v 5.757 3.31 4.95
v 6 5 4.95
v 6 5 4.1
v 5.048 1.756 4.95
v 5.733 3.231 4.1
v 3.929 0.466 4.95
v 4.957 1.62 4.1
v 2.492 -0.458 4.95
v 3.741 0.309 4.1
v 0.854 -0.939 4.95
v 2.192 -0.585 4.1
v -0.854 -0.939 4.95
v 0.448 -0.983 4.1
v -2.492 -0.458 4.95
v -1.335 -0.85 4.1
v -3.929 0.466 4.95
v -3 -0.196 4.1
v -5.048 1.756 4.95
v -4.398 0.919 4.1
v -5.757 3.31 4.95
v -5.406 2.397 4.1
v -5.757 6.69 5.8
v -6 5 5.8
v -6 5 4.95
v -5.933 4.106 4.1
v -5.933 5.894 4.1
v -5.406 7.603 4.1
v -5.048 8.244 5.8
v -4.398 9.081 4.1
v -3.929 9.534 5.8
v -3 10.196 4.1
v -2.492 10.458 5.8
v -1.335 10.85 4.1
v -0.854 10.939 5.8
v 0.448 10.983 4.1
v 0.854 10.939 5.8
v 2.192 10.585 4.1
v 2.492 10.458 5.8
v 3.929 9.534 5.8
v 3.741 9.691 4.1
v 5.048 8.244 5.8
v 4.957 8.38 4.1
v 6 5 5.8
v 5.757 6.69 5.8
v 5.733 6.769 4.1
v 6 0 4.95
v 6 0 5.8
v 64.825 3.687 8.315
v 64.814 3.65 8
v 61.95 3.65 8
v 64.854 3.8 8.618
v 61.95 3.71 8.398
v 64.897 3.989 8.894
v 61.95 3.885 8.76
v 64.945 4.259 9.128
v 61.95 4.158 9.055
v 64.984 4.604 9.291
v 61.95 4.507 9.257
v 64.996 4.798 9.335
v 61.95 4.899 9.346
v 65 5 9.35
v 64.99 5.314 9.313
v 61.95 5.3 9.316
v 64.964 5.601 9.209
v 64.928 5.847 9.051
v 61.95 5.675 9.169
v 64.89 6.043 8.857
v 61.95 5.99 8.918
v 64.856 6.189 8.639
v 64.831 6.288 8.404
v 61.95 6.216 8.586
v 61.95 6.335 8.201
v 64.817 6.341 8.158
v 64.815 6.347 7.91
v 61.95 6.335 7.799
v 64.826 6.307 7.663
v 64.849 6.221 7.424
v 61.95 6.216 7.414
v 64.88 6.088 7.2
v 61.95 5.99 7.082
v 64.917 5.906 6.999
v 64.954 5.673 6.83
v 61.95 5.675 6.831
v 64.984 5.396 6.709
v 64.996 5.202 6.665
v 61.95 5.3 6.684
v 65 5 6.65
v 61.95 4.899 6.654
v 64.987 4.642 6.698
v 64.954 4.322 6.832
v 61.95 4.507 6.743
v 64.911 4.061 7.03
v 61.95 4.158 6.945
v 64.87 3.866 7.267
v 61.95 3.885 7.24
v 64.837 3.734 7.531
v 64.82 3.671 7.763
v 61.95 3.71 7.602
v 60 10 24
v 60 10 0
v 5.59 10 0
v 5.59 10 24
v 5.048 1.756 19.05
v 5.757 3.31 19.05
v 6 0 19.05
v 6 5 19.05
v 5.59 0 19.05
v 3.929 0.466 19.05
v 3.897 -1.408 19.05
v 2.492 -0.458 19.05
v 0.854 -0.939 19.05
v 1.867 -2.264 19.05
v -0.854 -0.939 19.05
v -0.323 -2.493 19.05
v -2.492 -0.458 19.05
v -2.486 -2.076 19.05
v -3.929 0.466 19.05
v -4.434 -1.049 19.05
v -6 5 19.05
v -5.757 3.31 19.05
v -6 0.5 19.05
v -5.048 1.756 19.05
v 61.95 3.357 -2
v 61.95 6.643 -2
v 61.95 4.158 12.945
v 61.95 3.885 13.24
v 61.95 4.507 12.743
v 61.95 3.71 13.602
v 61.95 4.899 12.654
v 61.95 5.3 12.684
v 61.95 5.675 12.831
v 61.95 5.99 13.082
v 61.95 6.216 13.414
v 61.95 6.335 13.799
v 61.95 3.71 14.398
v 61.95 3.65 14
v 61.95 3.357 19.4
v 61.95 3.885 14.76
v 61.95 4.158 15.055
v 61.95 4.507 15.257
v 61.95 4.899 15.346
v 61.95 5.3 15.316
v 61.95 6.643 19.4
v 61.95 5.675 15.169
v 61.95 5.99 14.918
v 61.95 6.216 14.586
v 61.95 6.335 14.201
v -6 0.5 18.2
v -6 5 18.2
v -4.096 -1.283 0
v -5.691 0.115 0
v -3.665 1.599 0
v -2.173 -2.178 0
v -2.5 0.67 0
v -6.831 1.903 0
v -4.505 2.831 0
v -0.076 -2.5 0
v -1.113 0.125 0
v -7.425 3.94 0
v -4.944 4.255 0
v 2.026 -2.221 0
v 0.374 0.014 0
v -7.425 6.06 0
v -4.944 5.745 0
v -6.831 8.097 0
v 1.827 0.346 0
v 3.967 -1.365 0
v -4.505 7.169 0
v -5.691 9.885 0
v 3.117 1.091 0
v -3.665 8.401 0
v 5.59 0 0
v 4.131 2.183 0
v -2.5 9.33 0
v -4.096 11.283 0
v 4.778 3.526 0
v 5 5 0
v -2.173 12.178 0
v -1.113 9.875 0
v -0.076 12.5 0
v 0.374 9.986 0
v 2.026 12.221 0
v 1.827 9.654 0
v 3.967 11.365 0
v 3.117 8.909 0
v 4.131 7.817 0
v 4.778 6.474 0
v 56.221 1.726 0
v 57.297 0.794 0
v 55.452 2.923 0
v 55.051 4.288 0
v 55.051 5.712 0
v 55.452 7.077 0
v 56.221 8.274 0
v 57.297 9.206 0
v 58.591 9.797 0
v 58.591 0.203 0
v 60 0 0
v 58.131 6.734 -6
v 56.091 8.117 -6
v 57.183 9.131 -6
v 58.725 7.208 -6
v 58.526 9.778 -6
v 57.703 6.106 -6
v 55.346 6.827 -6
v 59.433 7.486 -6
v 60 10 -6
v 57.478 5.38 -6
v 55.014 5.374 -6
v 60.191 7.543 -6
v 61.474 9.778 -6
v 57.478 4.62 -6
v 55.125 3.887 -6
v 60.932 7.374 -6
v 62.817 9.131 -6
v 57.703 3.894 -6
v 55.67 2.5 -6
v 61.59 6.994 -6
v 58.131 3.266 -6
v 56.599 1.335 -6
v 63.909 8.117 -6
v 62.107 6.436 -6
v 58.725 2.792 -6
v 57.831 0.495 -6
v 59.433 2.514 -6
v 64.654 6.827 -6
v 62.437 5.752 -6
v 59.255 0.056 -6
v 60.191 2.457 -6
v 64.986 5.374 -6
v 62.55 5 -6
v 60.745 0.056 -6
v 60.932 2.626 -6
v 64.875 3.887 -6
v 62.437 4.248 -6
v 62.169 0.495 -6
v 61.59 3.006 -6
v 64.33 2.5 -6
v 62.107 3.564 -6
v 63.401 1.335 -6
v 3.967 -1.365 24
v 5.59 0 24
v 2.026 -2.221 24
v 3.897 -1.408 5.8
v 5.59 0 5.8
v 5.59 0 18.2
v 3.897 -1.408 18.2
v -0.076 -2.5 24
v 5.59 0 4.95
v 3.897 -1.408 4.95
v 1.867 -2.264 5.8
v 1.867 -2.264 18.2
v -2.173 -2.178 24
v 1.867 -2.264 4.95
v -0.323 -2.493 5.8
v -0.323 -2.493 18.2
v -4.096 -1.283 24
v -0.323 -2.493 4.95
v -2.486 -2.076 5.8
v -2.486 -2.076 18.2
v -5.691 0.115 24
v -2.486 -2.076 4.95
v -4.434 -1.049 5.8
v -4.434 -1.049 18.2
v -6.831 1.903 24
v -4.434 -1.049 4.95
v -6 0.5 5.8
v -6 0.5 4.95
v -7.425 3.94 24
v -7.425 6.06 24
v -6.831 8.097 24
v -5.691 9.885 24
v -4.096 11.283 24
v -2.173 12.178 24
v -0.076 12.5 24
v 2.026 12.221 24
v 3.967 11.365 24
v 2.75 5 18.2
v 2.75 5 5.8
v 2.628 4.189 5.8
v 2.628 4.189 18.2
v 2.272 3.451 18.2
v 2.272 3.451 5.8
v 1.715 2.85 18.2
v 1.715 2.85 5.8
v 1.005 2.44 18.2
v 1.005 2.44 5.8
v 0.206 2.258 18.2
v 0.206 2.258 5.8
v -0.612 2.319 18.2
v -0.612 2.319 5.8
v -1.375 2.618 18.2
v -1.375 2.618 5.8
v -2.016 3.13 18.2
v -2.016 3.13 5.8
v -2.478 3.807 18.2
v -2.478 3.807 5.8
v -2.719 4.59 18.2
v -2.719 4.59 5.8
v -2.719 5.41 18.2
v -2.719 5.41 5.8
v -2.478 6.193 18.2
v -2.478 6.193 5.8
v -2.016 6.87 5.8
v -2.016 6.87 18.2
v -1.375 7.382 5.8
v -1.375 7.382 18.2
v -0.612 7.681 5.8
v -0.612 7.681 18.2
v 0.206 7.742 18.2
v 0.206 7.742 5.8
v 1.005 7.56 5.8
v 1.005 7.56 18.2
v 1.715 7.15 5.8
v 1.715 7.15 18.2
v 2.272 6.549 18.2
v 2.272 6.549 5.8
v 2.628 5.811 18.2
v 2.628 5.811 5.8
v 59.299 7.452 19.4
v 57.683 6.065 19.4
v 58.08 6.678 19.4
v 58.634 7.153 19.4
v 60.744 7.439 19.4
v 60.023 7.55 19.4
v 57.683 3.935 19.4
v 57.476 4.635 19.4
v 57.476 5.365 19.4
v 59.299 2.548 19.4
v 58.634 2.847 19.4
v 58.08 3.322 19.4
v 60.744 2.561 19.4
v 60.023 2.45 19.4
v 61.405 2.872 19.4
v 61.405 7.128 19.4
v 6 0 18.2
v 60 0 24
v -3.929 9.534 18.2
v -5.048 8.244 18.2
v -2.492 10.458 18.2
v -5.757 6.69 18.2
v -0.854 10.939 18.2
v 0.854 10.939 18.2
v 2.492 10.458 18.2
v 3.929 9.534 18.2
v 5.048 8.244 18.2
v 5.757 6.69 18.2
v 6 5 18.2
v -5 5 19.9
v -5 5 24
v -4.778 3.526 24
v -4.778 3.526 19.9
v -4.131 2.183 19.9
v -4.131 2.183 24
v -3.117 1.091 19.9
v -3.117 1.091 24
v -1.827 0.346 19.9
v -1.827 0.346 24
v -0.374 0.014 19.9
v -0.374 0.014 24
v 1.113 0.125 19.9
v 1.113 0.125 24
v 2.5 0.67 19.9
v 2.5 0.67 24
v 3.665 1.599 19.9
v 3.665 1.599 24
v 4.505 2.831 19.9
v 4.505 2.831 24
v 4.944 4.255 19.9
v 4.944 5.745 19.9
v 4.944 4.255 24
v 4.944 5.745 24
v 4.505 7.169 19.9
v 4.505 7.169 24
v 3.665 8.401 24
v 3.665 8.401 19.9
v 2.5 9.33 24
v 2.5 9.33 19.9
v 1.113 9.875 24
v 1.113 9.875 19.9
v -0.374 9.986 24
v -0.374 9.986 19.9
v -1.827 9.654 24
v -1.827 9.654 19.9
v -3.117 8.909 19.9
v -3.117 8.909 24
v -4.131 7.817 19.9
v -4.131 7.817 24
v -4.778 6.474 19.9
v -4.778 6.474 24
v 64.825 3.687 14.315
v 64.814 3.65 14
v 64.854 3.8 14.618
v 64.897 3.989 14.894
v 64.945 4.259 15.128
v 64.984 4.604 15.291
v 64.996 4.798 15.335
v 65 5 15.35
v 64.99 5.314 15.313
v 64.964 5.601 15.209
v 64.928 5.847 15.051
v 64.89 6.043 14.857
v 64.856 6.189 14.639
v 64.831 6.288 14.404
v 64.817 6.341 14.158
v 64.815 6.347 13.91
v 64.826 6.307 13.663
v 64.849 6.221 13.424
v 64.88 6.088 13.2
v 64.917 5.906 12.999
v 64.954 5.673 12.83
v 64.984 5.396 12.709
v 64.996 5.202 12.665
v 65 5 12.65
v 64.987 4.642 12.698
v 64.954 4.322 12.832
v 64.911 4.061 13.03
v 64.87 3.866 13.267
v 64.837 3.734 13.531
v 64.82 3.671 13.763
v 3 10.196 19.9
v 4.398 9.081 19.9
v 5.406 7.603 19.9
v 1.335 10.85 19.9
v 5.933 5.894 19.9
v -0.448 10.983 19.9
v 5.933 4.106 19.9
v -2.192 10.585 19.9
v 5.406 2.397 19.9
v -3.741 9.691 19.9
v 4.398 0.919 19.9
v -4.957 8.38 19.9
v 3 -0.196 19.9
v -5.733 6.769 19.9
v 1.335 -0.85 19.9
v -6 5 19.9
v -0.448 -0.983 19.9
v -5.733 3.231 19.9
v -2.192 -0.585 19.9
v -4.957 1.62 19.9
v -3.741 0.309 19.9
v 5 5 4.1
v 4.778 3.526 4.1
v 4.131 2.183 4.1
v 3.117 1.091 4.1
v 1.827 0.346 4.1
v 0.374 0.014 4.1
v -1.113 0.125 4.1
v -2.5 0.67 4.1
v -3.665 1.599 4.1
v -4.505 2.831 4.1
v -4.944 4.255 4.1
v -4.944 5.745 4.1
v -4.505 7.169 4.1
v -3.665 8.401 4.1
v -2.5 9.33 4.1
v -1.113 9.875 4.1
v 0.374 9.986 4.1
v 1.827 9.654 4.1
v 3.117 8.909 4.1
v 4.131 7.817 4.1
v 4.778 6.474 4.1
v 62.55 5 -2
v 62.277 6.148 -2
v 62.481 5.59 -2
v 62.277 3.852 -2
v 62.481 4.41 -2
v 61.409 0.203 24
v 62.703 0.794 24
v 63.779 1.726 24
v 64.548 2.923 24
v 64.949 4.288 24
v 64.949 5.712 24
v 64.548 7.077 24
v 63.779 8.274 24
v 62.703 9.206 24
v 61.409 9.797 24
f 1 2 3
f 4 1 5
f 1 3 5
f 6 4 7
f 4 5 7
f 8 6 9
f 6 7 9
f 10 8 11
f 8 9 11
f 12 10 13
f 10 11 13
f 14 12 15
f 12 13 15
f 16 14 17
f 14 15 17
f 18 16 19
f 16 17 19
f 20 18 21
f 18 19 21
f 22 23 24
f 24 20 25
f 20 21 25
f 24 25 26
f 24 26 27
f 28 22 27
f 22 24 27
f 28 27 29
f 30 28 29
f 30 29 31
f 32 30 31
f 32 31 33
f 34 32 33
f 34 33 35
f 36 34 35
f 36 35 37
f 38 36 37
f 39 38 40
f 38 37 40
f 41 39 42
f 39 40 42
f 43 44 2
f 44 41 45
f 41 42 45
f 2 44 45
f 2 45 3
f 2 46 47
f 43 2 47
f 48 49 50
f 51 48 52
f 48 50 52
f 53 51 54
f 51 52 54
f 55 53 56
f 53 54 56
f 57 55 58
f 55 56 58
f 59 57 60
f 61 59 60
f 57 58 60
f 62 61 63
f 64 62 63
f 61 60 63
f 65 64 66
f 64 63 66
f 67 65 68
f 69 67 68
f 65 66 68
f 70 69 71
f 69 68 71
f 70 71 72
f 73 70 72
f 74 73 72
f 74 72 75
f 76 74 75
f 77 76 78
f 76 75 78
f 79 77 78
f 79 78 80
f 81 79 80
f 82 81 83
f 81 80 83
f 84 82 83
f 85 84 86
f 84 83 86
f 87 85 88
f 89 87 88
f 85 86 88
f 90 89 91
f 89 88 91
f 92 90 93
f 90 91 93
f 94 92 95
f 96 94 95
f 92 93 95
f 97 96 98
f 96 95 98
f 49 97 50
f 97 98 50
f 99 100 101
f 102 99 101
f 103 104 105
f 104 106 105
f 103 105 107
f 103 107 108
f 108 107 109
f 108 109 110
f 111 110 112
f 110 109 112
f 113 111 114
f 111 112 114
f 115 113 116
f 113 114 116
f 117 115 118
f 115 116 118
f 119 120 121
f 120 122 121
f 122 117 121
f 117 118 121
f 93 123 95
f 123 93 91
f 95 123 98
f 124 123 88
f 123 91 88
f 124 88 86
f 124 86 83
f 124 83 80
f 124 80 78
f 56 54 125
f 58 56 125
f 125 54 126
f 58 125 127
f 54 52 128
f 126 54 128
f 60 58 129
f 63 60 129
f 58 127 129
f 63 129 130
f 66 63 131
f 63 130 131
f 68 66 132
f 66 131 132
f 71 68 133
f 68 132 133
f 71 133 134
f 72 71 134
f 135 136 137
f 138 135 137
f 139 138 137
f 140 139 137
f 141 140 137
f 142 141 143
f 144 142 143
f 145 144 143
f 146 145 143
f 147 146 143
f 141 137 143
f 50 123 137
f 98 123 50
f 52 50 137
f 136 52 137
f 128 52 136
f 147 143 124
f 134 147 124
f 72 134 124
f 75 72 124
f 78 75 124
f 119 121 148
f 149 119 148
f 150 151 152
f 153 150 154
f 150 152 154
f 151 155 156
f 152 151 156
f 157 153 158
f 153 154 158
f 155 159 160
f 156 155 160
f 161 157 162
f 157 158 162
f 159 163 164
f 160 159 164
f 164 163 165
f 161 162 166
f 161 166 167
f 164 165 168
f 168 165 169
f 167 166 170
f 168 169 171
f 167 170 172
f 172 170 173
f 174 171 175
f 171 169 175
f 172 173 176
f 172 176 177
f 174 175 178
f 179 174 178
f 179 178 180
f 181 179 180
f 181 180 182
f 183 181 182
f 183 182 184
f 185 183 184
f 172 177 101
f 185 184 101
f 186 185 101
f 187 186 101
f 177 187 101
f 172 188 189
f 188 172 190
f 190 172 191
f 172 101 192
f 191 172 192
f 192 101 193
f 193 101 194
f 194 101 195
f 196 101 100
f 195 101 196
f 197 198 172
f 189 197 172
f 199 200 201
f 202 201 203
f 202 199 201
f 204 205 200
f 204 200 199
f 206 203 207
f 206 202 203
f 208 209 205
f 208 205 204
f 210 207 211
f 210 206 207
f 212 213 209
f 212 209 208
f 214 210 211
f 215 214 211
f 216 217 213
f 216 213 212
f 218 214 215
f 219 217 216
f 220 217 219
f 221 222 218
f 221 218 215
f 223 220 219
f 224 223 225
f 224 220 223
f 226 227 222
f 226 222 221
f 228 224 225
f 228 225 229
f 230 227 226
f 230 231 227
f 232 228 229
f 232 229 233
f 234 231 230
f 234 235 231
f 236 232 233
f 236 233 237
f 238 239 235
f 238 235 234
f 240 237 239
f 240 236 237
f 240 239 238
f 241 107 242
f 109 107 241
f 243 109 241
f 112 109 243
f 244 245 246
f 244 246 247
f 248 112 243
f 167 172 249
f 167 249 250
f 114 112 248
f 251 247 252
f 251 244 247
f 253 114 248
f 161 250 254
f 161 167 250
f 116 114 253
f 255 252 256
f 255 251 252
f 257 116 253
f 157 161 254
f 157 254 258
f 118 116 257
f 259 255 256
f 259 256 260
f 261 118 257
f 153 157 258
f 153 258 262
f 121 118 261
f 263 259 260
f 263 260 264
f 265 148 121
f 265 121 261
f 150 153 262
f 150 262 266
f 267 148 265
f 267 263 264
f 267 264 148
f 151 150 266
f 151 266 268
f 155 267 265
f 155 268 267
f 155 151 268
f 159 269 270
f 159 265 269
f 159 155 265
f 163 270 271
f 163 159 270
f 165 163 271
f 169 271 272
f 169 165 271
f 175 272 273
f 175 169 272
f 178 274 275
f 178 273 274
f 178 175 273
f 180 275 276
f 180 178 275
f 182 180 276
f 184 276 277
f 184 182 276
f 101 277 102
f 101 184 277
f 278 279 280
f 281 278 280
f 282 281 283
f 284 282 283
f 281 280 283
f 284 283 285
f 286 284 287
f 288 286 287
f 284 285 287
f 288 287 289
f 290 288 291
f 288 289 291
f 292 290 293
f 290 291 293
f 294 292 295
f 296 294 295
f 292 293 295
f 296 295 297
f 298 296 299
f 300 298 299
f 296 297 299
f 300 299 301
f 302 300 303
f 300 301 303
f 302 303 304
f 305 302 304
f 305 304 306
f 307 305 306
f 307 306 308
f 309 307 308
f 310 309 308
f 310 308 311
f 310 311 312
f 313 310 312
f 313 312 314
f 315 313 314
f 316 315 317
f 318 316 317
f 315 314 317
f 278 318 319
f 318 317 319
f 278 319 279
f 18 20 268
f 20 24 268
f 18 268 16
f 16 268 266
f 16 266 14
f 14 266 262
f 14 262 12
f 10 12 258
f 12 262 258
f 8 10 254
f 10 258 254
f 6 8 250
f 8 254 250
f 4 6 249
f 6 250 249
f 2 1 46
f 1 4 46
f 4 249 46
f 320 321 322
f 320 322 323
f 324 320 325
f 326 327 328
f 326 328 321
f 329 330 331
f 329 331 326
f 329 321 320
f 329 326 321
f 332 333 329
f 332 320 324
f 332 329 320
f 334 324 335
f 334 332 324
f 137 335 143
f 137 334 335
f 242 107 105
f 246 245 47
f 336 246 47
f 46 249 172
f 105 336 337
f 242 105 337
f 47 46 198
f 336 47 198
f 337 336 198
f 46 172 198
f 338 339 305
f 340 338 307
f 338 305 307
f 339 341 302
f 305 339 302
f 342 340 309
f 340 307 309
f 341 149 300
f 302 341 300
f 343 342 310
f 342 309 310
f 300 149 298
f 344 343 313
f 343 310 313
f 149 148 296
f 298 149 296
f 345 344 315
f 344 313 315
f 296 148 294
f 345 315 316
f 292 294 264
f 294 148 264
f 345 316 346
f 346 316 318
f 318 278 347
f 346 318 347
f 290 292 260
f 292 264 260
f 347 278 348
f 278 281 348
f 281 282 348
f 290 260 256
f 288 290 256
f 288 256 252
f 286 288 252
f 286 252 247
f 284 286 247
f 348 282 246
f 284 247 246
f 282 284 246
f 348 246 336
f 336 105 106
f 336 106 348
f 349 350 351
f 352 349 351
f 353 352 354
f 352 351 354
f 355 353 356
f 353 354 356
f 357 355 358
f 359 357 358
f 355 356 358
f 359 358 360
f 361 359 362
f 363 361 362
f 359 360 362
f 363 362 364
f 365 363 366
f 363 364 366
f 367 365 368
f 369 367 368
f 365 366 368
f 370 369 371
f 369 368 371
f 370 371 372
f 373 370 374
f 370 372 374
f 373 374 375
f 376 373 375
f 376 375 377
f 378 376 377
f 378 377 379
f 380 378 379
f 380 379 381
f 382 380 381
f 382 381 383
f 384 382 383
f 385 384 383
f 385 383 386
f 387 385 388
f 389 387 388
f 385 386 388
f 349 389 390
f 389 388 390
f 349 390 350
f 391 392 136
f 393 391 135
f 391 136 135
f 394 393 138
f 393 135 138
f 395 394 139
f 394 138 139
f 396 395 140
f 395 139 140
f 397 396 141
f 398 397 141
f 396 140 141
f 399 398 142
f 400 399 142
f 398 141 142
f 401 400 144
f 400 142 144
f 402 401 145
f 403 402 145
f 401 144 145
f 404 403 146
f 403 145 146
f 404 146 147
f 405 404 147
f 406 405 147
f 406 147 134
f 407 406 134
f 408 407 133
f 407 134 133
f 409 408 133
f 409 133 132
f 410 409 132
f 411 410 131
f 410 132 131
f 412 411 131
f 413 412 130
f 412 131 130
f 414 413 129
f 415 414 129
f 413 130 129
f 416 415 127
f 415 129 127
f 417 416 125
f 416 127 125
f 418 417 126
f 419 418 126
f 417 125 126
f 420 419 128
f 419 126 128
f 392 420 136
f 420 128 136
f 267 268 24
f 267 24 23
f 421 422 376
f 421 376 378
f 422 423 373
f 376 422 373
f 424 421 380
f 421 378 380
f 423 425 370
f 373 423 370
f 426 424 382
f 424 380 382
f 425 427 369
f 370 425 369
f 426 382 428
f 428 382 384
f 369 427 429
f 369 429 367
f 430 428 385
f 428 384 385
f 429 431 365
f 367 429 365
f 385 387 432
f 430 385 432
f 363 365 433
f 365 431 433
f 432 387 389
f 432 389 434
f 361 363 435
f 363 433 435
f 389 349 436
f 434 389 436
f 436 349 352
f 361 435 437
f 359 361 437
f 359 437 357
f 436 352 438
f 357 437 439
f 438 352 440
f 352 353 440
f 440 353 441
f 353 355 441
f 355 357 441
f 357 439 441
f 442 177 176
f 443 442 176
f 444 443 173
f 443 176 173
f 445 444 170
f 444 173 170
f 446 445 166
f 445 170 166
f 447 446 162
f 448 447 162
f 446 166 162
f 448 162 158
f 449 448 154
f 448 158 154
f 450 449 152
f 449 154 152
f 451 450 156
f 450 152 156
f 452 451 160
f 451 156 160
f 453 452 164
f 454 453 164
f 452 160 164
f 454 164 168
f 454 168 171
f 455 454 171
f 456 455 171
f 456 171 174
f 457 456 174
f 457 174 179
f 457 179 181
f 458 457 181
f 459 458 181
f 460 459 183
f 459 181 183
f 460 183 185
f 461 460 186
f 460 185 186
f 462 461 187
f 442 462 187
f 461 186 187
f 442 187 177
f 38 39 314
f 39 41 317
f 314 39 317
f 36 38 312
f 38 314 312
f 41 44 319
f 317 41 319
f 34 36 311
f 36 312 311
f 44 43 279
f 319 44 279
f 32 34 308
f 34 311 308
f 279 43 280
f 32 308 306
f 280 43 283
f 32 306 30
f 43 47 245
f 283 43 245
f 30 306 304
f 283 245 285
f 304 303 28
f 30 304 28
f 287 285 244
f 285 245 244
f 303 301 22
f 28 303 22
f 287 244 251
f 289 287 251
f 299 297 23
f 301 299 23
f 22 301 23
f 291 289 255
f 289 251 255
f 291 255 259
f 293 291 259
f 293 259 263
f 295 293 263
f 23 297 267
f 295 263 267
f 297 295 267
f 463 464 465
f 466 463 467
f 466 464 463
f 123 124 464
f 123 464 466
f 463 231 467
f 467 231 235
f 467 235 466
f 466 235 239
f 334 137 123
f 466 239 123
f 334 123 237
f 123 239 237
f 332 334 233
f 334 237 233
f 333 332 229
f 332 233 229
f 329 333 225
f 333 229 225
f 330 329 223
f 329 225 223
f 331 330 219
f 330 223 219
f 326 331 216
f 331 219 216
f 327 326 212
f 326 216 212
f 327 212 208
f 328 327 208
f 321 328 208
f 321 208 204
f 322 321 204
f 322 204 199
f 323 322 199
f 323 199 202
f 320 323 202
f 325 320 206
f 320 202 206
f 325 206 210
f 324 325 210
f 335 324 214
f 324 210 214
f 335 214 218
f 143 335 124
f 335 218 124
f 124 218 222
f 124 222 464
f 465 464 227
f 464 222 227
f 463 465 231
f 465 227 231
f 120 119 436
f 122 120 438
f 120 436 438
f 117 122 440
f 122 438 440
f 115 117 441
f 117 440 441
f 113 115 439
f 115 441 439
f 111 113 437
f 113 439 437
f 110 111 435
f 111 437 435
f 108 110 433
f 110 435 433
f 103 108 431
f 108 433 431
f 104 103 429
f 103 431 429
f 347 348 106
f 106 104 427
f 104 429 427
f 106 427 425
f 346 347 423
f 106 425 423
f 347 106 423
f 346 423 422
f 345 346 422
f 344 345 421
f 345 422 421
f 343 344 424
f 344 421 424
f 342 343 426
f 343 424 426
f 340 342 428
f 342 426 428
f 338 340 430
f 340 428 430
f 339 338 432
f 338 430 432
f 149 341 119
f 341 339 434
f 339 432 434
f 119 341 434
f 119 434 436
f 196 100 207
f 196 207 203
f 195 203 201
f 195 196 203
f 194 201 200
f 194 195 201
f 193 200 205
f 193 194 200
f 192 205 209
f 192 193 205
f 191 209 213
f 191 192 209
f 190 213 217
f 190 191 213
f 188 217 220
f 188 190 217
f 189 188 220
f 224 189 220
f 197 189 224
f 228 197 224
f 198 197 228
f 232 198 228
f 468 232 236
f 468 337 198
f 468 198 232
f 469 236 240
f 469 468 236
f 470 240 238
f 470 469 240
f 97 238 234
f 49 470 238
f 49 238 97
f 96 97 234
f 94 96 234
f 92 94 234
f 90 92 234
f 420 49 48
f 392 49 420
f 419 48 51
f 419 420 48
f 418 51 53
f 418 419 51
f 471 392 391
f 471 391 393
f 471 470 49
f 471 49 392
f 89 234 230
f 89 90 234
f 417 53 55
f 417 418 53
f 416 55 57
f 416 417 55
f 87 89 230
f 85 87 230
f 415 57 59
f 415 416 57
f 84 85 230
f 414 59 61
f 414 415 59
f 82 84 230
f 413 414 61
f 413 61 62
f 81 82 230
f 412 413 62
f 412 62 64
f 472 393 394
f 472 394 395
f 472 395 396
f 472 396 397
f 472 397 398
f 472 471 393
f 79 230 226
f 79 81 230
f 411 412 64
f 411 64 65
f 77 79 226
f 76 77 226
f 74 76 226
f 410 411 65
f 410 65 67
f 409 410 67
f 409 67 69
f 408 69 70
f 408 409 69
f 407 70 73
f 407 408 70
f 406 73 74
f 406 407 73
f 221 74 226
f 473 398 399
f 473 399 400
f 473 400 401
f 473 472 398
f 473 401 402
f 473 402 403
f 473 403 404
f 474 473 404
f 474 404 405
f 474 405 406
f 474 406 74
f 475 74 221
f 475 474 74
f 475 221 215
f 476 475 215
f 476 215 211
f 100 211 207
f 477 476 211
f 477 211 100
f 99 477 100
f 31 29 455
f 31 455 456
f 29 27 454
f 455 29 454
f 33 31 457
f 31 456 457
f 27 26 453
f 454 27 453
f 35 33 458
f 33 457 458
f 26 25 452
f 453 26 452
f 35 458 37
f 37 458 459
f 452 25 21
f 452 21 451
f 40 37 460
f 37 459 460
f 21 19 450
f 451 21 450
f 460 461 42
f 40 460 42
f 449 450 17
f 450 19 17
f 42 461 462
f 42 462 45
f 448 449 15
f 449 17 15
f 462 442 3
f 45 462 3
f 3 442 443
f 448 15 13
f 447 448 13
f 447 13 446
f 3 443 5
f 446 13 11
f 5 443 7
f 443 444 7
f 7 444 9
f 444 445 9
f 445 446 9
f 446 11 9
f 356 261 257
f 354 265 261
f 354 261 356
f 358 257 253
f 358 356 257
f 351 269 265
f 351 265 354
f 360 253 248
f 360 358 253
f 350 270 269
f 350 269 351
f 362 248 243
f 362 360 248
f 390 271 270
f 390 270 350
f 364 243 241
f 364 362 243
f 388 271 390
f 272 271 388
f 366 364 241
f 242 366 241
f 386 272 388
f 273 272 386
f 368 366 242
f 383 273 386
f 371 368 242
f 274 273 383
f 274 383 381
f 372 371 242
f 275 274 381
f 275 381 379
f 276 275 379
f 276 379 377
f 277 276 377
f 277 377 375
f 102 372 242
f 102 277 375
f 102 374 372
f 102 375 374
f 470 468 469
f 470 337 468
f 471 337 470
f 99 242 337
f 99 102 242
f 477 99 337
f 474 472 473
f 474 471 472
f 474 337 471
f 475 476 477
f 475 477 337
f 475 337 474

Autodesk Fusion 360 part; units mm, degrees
sketch "スケッチ1" plane through (0, 0, 0) normal (0, 0, 1) x (1, 0, 0)
  line L0 (0, 0) -> (60, 0)
  line L1 (60, 0) -> (60, 10)
  line L2 (60, 10) -> (0, 10)
  line L3 (0, 10) -> (0, 0)
  circle A0 centre (0, 5) radius 7.5
  dimension "d1" = 15
sketch "スケッチ2" plane through (0, 0, 0) normal (0, 0, 1) x (1, 0, 0)
sketch "スケッチ3" plane through (0, 0, 0) normal (0, 0, 1) x (1, 0, 0)
sketch "スケッチ4" plane through (0, 0, 0) normal (0, 0, 1) x (1, 0, 0)
  circle A0 centre (60, 5) radius 5
extrude "押し出し1" add sketch "スケッチ4" sketch "スケッチ1" along normal blind 24 of sketch 2
sketch "スケッチ5" plane through (0, 0, 0) normal (0, 0, -1) x (1, 0, 0)
  arc A0 (60, -10) -> (60, 0) centre (60, -5) ccw
  line L0 (60, 0) -> (5.5902, 0)
  arc A1 (5.5902, 0) -> (5.5902, -10) centre (0, -5) ccw
  line L1 (5.5902, -10) -> (60, -10)
  circle A2 centre (60, -5) radius 5
extrude "押し出し2" add sketch "スケッチ5" along normal blind 6 contours A0 A2
sketch "スケッチ6" plane through (0, 0, 0) normal (0, 0, -1) x (1, 0, 0)
  arc A0 (60, 0) -> (60, -10) centre (60, -5) ccw
  line L0 (60, 0) -> (5.5902, 0)
  arc A1 (5.5902, 0) -> (5.5902, -10) centre (0, -5) ccw
  line L1 (5.5902, -10) -> (60, -10)
  circle A2 centre (0, -5) radius 5
  dimension "d6" = 10
extrude "押し出し3" cut sketch "スケッチ6" against normal blind 4.1 contours A2
sketch "スケッチ7" plane through (0, 0, 24) normal (0, 0, 1) x (-1, 0, 0)
  arc A0 (-60, 0) -> (-60, -10) centre (-60, -5) ccw
  line L0 (-60, -10) -> (-5.5902, -10)
  arc A1 (-5.5902, -10) -> (-5.5902, 0) centre (0, -5) ccw
  line L1 (-5.5902, 0) -> (-60, 0)
  circle A2 centre (0, -5) radius 5
  dimension "d9" = 10
extrude "押し出し4" cut sketch "スケッチ7" against normal blind 4.1 contours A2
sketch "スケッチ8" plane through (0, 0, 0) normal (0, 1, 0) x (1, 0, 0)
sketch "スケッチ9" plane through (0, 0, 0) normal (0, 1, 0) x (1, 0, 0)
sketch "スケッチ10" plane through (0, 0, 4.1) normal (0, 0, -1) x (1, 0, 0)
  circle A0 centre (0, -5) radius 5
  circle A1 centre (0, -5) radius 6
  dimension "d12" = 12
extrude "押し出し5" cut sketch "スケッチ10" against normal blind 0.85 contours A0 | A1
extrude "押し出し6" cut 1 faces at (-0.8908, 6.4538, 4.95) along direction (0, 0, 1) blind 0.85
sketch "スケッチ11" plane through (0, 0, 19.9) normal (0, 0, 1) x (-1, 0, 0)
  circle A0 centre (0, -5) radius 5
  circle A1 centre (0, -5) radius 6
  dimension "d17" = 12
extrude "押し出し7" cut sketch "スケッチ11" against normal blind 0.85 contours A0 | A1
extrude "押し出し8" cut 1 faces at (1.5116, 5.0736, 19.05) along direction (0, 0, -1) blind 0.85
sketch "スケッチ19" plane through (0, 0, 18.2) normal (0, 0, 1) x (-1, 0, 0)
  circle A0 centre (0, -5) radius 6
  line L0 (-6, -5) -> (6, -5)
  line L1 (6, -5) -> (6, -10)
  line L2 (6, -10) -> (-6, -10)
  line L3 (-6, -10) -> (-6, -5)
sketch "スケッチ20" plane through (0, 0, 0) normal (0, 1, 0) x (1, 0, 0)
  line L0 (6, -18.2) -> (-6, -18.2)
  line L1 (-6, -18.2) -> (-6, -19.05)
  line L2 (-6, -19.05) -> (6, -19.05)
  line L3 (6, -19.05) -> (6, -18.2)
  dimension "d27" = 0.85
extrude "押し出し9" cut sketch "スケッチ20" against normal blind 2.5
sketch "スケッチ21" plane through (0, 0, 0) normal (0, -1, 0) x (1, 0, 0)
  line L0 (5.5902, 18.2) -> (5.5902, 0)
  line L1 (5.5902, 0) -> (60, 0)
  line L2 (60, 0) -> (60, 24)
  line L3 (60, 24) -> (5.5902, 24)
  line L4 (5.5902, 24) -> (5.5902, 19.05)
  line L5 (5.5902, 19.05) -> (3.3166, 19.05)
  line L6 (3.3166, 19.05) -> (3.3166, 18.2)
  line L7 (3.3166, 18.2) -> (5.5902, 18.2)
  line L8 (6, 18.2) -> (3.3166, 18.2)
  line L9 (3.3166, 18.2) -> (3.3166, 19.05)
  line L10 (3.3166, 19.05) -> (6, 19.05)
  line L11 (6, 19.05) -> (6, 18.2)
  line L12 (-6, 18.2) -> (-3.308, 18.2)
  line L13 (-3.308, 18.2) -> (-3.308, 19.05)
  line L14 (-3.308, 19.05) -> (-6, 19.05)
  line L15 (-6, 19.05) -> (-6, 18.2)
extrude "押し出し10" cut sketch "スケッチ21" against normal blind 5 contours L5 L6 L7 L8 L9 L10 L11 | L12 L13 L14 L15
sketch "スケッチ22" plane through (0, 0, 5.8) normal (0, 0, -1) x (1, 0, 0)
  circle A0 centre (0, -5) radius 6
  line L0 (6, -5) -> (-6, -5)
  line L1 (-6, -5) -> (-6, 0)
  line L2 (-6, 0) -> (6, 0)
  line L3 (6, 0) -> (6, -5)
sketch "スケッチ23" plane through (0, 0, 0) normal (0, 1, 0) x (1, 0, 0)
  line L0 (6, -5.8) -> (-6, -5.8)
  line L1 (-6, -5.8) -> (-6, -4.95)
  line L2 (-6, -4.95) -> (6, -4.95)
  line L3 (6, -4.95) -> (6, -5.8)
  dimension "d32" = 0.85
extrude "押し出し11" cut sketch "スケッチ23" against normal blind 2.5
sketch "スケッチ24" plane through (0, 0, 0) normal (0, -1, 0) x (1, 0, 0)
  line L0 (5.5902, 4.95) -> (5.5902, 0)
  line L1 (5.5902, 0) -> (60, 0)
  line L2 (60, 0) -> (60, 24)
  line L3 (60, 24) -> (5.5902, 24)
  line L4 (5.5902, 24) -> (5.5902, 19.05)
  line L5 (5.5902, 19.05) -> (6, 19.05)
  line L6 (6, 19.05) -> (6, 18.2)
  line L7 (6, 18.2) -> (5.5902, 18.2)
  line L8 (5.5902, 18.2) -> (5.5902, 5.8)
  line L9 (5.5902, 5.8) -> (3.3166, 5.8)
  line L10 (3.3166, 5.8) -> (3.3166, 4.95)
  line L11 (3.3166, 4.95) -> (5.5902, 4.95)
  line L12 (6, 5.8) -> (3.3166, 5.8)
  line L13 (3.3166, 5.8) -> (3.3166, 4.95)
  line L14 (3.3166, 4.95) -> (6, 4.95)
  line L15 (6, 4.95) -> (6, 5.8)
  line L16 (-6, 5.8) -> (-3.3133, 5.8)
  line L17 (-3.3133, 5.8) -> (-3.3133, 4.95)
  line L18 (-3.3133, 4.95) -> (-6, 4.95)
  line L19 (-6, 4.95) -> (-6, 5.8)
extrude "押し出し12" cut sketch "スケッチ24" against normal blind 5 contours L9 L10 L11 L12 L13 L14 L15 | L16 L17 L18 L19
sketch "スケッチ25" plane through (0, 0, -6) normal (0, 0, -1) x (1, 0, 0)
  circle A0 centre (60, -5) radius 5
  circle A1 centre (60, -5) radius 2.55
  dimension "d37" = 5.1
extrude "押し出し13" cut sketch "スケッチ25" against normal blind 25.4 contours A1
sketch "スケッチ26" plane through (0, 0, 19.4) normal (0, 0, -1) x (1, 0, 0)
  circle A0 centre (60, -5) radius 2.55
  line L0 (62.55, -5) -> (61.95, -5)
  line L1 (61.95, -5) -> (61.95, -6.6432)
  line L2 (61.95, -5) -> (61.95, -3.3568)
  dimension "d40" = 0.6
extrude "押し出し14" add sketch "スケッチ26" along normal blind 21.4 contours A0 L0 L2 | A0 L0 L1
sketch "スケッチ27" plane through (61.95, 0, 0) normal (-1, 0, 0) x (0, -1, 0)
  line L0 (-3.3568, 19.4) -> (-6.6432, 19.4)
  line L1 (-6.6432, 19.4) -> (-6.6432, -2)
  line L2 (-6.6432, -2) -> (-3.3568, -2)
  line L3 (-3.3568, -2) -> (-3.3568, 19.4)
  circle A0 centre (-5, 14) radius 1.35
  circle A1 centre (-5, 8) radius 1.35
  dimension "d43" = 2.7
  dimension "d44" = 2.7
extrude "押し出し15" cut sketch "スケッチ27" against normal blind 3.5 contours A0 | A1
sketch "スケッチ28" plane through (0, 0, 5.8) normal (0, 0, -1) x (1, 0, 0)
  circle A0 centre (0, -5) radius 2.75
  dimension "d47" = 5.5
extrude "押し出し16" cut sketch "スケッチ28" against normal blind 15
